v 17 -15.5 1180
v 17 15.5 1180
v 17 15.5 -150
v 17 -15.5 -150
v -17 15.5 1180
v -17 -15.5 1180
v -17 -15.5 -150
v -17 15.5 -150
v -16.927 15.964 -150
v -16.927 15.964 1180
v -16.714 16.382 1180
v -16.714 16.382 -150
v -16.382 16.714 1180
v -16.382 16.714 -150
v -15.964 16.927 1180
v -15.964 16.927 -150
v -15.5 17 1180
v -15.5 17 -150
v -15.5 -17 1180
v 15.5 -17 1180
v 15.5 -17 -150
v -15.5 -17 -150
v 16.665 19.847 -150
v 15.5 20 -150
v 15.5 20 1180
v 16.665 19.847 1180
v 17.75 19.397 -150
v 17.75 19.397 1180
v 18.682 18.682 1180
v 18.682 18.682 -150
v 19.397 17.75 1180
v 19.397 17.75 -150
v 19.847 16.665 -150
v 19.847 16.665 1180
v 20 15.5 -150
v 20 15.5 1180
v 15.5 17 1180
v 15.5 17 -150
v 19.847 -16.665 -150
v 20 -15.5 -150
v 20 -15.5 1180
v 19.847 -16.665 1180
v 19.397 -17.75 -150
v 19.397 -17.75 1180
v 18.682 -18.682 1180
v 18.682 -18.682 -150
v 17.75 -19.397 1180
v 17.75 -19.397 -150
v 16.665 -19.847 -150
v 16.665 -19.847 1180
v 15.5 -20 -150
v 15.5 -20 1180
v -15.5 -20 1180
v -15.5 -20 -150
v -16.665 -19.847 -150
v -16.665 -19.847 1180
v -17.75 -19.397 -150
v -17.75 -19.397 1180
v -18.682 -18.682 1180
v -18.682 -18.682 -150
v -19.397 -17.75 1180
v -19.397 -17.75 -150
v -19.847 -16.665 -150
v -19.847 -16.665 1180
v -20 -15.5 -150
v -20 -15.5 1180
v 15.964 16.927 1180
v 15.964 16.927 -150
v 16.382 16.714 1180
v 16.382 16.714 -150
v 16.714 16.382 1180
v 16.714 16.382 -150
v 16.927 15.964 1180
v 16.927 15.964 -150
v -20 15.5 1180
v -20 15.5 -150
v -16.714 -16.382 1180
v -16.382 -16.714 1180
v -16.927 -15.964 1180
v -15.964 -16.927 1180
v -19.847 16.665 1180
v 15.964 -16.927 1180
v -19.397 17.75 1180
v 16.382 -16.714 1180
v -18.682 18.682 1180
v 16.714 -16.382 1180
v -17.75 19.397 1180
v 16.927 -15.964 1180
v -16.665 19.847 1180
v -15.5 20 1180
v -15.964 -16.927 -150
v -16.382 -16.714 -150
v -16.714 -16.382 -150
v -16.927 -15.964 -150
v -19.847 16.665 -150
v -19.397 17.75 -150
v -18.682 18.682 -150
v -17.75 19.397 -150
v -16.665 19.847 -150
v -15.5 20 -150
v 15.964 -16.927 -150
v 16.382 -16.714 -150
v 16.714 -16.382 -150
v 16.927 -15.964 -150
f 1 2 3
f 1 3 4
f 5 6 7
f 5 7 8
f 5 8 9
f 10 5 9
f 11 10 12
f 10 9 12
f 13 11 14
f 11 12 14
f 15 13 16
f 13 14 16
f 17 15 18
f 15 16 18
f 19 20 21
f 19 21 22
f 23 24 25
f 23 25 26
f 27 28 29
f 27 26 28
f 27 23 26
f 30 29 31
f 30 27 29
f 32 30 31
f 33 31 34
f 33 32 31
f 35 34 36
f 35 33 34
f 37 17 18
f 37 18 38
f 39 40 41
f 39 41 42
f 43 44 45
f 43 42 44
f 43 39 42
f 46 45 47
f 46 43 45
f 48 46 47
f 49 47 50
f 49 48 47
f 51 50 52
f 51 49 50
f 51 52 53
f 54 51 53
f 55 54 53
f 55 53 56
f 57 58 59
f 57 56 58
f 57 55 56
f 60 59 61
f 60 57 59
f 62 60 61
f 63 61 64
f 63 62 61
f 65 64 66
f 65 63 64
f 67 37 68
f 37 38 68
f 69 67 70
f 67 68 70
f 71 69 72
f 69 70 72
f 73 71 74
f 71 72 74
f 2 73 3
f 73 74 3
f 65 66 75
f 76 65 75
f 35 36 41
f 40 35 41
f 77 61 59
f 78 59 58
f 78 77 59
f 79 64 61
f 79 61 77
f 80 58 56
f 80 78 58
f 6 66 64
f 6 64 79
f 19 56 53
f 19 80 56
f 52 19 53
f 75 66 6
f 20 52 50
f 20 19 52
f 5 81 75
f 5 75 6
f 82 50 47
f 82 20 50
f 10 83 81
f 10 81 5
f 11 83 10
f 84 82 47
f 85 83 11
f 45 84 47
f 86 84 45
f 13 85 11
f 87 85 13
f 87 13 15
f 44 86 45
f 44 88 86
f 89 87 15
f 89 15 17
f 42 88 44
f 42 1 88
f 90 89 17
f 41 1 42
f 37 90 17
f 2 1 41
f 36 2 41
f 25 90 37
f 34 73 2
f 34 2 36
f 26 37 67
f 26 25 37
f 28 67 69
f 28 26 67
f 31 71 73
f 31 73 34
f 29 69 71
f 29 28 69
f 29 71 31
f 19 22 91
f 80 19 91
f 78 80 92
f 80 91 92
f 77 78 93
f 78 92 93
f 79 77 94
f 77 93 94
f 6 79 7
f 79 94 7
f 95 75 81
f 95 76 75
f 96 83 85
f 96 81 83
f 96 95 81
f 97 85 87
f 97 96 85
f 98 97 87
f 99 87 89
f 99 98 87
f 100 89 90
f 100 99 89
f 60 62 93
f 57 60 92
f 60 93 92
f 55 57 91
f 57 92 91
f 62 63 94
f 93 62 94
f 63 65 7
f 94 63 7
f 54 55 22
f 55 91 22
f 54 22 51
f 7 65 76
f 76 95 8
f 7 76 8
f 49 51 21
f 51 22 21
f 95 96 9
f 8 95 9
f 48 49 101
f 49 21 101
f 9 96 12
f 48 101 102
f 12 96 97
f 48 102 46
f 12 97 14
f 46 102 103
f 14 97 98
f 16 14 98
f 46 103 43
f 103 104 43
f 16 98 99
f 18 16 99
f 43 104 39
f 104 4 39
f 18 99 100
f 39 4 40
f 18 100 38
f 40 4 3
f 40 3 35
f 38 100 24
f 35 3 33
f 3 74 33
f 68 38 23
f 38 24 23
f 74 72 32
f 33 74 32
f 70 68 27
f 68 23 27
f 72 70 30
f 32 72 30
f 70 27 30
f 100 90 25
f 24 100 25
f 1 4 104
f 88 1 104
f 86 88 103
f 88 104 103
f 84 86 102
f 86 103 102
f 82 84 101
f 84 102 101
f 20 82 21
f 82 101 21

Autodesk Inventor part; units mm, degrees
ref_plane "Start Plane" through (0, 0, -150) normal (0, 0, 1) x (1, 0, 0)
ref_plane "End Plane" through (0, 0, 1180) normal (0, 0, 1) x (1, 0, 0)
sketch "Sketch" plane through (0, 0, 0) normal (0, 0, 1) x (1, 0, 0)
  line L0 (-20, -15.5) -> (-20, 15.5)
  line L1 (-15.5, 20) -> (15.5, 20)
  line L2 (20, 15.5) -> (20, -15.5)
  line L3 (15.5, -20) -> (-15.5, -20)
  arc A0 (-20, -15.5) -> (-15.5, -20) centre (-15.5, -15.5) ccw
  arc A1 (-15.5, 20) -> (-20, 15.5) centre (-15.5, 15.5) ccw
  arc A2 (20, 15.5) -> (15.5, 20) centre (15.5, 15.5) ccw
  arc A3 (15.5, -20) -> (20, -15.5) centre (15.5, -15.5) ccw
  arc A4 (-15.5, 17) -> (-17, 15.5) centre (-15.5, 15.5) ccw
  line L4 (-15.5, 17) -> (15.5, 17)
  arc A5 (17, 15.5) -> (15.5, 17) centre (15.5, 15.5) ccw
  line L5 (17, 15.5) -> (17, -15.5)
  arc A6 (15.5, -17) -> (17, -15.5) centre (15.5, -15.5) ccw
  line L6 (15.5, -17) -> (-15.5, -17)
  arc A7 (-17, -15.5) -> (-15.5, -17) centre (-15.5, -15.5) ccw
  line L7 (-17, -15.5) -> (-17, 15.5)
  line L8 (0, 29.3048) -> (0, -29.3048) construction
  line L9 (-29.3048, 0) -> (29.3048, 0) construction
  dimension "d7" = 4.5
  dimension "d10" = 40
  dimension "d11" = 40
  dimension "d12" = 3
  dimension "d15" = 20
  dimension "d16" = 20
extrude "Body" add sketch "Sketch" along normal up to surface (1330 mm away) from surface at -150
sketch "Sketch3" plane through (0, 0, 0) normal (0, 0, 1) x (1, 0, 0)
  line L0 (0, 0) -> (10, 0)
ref_plane "Work Plane3" through (0, 0, 0) normal (0, -1, 0) x (1, 0, 0)
ref_plane "Work Plane4" through (0, -984.5, 1180) normal (0, 0, 1) x (1, 0, 0)
split "Split1" plane through (0, -984.5, 1180) removes the side toward (0, 0, 1)
sketch "Sketch4" plane through (0, 0, 0) normal (0, -1, 0) x (1, 0, 0)
  line L0 (-2, -150) -> (12, -150) projected
  line L1 (-2, 1180) -> (12, 1180) projected
  dimension "d18" = 1330
equation "\"d7\" = G_IR"
equation "\"d10\" = G_H"
equation "\"d11\" = G_W"
equation "\"d12\" = G_T"
equation "\"d15\" = 0.5 * d10"
equation "\"d16\" = 0.5 * d11"
equation "\"d3\" = G_L"
equation "\"G_W\" = 40"
equation "\"G_H\" = 40"
equation "\"G_T\" = 3"
equation "\"G_IR\" = 4.5"
equation "\"G_L\" = d18"
properties part number "ISO 12633-2 - 40x40x3 - 1330" material "Steel, Mild"
